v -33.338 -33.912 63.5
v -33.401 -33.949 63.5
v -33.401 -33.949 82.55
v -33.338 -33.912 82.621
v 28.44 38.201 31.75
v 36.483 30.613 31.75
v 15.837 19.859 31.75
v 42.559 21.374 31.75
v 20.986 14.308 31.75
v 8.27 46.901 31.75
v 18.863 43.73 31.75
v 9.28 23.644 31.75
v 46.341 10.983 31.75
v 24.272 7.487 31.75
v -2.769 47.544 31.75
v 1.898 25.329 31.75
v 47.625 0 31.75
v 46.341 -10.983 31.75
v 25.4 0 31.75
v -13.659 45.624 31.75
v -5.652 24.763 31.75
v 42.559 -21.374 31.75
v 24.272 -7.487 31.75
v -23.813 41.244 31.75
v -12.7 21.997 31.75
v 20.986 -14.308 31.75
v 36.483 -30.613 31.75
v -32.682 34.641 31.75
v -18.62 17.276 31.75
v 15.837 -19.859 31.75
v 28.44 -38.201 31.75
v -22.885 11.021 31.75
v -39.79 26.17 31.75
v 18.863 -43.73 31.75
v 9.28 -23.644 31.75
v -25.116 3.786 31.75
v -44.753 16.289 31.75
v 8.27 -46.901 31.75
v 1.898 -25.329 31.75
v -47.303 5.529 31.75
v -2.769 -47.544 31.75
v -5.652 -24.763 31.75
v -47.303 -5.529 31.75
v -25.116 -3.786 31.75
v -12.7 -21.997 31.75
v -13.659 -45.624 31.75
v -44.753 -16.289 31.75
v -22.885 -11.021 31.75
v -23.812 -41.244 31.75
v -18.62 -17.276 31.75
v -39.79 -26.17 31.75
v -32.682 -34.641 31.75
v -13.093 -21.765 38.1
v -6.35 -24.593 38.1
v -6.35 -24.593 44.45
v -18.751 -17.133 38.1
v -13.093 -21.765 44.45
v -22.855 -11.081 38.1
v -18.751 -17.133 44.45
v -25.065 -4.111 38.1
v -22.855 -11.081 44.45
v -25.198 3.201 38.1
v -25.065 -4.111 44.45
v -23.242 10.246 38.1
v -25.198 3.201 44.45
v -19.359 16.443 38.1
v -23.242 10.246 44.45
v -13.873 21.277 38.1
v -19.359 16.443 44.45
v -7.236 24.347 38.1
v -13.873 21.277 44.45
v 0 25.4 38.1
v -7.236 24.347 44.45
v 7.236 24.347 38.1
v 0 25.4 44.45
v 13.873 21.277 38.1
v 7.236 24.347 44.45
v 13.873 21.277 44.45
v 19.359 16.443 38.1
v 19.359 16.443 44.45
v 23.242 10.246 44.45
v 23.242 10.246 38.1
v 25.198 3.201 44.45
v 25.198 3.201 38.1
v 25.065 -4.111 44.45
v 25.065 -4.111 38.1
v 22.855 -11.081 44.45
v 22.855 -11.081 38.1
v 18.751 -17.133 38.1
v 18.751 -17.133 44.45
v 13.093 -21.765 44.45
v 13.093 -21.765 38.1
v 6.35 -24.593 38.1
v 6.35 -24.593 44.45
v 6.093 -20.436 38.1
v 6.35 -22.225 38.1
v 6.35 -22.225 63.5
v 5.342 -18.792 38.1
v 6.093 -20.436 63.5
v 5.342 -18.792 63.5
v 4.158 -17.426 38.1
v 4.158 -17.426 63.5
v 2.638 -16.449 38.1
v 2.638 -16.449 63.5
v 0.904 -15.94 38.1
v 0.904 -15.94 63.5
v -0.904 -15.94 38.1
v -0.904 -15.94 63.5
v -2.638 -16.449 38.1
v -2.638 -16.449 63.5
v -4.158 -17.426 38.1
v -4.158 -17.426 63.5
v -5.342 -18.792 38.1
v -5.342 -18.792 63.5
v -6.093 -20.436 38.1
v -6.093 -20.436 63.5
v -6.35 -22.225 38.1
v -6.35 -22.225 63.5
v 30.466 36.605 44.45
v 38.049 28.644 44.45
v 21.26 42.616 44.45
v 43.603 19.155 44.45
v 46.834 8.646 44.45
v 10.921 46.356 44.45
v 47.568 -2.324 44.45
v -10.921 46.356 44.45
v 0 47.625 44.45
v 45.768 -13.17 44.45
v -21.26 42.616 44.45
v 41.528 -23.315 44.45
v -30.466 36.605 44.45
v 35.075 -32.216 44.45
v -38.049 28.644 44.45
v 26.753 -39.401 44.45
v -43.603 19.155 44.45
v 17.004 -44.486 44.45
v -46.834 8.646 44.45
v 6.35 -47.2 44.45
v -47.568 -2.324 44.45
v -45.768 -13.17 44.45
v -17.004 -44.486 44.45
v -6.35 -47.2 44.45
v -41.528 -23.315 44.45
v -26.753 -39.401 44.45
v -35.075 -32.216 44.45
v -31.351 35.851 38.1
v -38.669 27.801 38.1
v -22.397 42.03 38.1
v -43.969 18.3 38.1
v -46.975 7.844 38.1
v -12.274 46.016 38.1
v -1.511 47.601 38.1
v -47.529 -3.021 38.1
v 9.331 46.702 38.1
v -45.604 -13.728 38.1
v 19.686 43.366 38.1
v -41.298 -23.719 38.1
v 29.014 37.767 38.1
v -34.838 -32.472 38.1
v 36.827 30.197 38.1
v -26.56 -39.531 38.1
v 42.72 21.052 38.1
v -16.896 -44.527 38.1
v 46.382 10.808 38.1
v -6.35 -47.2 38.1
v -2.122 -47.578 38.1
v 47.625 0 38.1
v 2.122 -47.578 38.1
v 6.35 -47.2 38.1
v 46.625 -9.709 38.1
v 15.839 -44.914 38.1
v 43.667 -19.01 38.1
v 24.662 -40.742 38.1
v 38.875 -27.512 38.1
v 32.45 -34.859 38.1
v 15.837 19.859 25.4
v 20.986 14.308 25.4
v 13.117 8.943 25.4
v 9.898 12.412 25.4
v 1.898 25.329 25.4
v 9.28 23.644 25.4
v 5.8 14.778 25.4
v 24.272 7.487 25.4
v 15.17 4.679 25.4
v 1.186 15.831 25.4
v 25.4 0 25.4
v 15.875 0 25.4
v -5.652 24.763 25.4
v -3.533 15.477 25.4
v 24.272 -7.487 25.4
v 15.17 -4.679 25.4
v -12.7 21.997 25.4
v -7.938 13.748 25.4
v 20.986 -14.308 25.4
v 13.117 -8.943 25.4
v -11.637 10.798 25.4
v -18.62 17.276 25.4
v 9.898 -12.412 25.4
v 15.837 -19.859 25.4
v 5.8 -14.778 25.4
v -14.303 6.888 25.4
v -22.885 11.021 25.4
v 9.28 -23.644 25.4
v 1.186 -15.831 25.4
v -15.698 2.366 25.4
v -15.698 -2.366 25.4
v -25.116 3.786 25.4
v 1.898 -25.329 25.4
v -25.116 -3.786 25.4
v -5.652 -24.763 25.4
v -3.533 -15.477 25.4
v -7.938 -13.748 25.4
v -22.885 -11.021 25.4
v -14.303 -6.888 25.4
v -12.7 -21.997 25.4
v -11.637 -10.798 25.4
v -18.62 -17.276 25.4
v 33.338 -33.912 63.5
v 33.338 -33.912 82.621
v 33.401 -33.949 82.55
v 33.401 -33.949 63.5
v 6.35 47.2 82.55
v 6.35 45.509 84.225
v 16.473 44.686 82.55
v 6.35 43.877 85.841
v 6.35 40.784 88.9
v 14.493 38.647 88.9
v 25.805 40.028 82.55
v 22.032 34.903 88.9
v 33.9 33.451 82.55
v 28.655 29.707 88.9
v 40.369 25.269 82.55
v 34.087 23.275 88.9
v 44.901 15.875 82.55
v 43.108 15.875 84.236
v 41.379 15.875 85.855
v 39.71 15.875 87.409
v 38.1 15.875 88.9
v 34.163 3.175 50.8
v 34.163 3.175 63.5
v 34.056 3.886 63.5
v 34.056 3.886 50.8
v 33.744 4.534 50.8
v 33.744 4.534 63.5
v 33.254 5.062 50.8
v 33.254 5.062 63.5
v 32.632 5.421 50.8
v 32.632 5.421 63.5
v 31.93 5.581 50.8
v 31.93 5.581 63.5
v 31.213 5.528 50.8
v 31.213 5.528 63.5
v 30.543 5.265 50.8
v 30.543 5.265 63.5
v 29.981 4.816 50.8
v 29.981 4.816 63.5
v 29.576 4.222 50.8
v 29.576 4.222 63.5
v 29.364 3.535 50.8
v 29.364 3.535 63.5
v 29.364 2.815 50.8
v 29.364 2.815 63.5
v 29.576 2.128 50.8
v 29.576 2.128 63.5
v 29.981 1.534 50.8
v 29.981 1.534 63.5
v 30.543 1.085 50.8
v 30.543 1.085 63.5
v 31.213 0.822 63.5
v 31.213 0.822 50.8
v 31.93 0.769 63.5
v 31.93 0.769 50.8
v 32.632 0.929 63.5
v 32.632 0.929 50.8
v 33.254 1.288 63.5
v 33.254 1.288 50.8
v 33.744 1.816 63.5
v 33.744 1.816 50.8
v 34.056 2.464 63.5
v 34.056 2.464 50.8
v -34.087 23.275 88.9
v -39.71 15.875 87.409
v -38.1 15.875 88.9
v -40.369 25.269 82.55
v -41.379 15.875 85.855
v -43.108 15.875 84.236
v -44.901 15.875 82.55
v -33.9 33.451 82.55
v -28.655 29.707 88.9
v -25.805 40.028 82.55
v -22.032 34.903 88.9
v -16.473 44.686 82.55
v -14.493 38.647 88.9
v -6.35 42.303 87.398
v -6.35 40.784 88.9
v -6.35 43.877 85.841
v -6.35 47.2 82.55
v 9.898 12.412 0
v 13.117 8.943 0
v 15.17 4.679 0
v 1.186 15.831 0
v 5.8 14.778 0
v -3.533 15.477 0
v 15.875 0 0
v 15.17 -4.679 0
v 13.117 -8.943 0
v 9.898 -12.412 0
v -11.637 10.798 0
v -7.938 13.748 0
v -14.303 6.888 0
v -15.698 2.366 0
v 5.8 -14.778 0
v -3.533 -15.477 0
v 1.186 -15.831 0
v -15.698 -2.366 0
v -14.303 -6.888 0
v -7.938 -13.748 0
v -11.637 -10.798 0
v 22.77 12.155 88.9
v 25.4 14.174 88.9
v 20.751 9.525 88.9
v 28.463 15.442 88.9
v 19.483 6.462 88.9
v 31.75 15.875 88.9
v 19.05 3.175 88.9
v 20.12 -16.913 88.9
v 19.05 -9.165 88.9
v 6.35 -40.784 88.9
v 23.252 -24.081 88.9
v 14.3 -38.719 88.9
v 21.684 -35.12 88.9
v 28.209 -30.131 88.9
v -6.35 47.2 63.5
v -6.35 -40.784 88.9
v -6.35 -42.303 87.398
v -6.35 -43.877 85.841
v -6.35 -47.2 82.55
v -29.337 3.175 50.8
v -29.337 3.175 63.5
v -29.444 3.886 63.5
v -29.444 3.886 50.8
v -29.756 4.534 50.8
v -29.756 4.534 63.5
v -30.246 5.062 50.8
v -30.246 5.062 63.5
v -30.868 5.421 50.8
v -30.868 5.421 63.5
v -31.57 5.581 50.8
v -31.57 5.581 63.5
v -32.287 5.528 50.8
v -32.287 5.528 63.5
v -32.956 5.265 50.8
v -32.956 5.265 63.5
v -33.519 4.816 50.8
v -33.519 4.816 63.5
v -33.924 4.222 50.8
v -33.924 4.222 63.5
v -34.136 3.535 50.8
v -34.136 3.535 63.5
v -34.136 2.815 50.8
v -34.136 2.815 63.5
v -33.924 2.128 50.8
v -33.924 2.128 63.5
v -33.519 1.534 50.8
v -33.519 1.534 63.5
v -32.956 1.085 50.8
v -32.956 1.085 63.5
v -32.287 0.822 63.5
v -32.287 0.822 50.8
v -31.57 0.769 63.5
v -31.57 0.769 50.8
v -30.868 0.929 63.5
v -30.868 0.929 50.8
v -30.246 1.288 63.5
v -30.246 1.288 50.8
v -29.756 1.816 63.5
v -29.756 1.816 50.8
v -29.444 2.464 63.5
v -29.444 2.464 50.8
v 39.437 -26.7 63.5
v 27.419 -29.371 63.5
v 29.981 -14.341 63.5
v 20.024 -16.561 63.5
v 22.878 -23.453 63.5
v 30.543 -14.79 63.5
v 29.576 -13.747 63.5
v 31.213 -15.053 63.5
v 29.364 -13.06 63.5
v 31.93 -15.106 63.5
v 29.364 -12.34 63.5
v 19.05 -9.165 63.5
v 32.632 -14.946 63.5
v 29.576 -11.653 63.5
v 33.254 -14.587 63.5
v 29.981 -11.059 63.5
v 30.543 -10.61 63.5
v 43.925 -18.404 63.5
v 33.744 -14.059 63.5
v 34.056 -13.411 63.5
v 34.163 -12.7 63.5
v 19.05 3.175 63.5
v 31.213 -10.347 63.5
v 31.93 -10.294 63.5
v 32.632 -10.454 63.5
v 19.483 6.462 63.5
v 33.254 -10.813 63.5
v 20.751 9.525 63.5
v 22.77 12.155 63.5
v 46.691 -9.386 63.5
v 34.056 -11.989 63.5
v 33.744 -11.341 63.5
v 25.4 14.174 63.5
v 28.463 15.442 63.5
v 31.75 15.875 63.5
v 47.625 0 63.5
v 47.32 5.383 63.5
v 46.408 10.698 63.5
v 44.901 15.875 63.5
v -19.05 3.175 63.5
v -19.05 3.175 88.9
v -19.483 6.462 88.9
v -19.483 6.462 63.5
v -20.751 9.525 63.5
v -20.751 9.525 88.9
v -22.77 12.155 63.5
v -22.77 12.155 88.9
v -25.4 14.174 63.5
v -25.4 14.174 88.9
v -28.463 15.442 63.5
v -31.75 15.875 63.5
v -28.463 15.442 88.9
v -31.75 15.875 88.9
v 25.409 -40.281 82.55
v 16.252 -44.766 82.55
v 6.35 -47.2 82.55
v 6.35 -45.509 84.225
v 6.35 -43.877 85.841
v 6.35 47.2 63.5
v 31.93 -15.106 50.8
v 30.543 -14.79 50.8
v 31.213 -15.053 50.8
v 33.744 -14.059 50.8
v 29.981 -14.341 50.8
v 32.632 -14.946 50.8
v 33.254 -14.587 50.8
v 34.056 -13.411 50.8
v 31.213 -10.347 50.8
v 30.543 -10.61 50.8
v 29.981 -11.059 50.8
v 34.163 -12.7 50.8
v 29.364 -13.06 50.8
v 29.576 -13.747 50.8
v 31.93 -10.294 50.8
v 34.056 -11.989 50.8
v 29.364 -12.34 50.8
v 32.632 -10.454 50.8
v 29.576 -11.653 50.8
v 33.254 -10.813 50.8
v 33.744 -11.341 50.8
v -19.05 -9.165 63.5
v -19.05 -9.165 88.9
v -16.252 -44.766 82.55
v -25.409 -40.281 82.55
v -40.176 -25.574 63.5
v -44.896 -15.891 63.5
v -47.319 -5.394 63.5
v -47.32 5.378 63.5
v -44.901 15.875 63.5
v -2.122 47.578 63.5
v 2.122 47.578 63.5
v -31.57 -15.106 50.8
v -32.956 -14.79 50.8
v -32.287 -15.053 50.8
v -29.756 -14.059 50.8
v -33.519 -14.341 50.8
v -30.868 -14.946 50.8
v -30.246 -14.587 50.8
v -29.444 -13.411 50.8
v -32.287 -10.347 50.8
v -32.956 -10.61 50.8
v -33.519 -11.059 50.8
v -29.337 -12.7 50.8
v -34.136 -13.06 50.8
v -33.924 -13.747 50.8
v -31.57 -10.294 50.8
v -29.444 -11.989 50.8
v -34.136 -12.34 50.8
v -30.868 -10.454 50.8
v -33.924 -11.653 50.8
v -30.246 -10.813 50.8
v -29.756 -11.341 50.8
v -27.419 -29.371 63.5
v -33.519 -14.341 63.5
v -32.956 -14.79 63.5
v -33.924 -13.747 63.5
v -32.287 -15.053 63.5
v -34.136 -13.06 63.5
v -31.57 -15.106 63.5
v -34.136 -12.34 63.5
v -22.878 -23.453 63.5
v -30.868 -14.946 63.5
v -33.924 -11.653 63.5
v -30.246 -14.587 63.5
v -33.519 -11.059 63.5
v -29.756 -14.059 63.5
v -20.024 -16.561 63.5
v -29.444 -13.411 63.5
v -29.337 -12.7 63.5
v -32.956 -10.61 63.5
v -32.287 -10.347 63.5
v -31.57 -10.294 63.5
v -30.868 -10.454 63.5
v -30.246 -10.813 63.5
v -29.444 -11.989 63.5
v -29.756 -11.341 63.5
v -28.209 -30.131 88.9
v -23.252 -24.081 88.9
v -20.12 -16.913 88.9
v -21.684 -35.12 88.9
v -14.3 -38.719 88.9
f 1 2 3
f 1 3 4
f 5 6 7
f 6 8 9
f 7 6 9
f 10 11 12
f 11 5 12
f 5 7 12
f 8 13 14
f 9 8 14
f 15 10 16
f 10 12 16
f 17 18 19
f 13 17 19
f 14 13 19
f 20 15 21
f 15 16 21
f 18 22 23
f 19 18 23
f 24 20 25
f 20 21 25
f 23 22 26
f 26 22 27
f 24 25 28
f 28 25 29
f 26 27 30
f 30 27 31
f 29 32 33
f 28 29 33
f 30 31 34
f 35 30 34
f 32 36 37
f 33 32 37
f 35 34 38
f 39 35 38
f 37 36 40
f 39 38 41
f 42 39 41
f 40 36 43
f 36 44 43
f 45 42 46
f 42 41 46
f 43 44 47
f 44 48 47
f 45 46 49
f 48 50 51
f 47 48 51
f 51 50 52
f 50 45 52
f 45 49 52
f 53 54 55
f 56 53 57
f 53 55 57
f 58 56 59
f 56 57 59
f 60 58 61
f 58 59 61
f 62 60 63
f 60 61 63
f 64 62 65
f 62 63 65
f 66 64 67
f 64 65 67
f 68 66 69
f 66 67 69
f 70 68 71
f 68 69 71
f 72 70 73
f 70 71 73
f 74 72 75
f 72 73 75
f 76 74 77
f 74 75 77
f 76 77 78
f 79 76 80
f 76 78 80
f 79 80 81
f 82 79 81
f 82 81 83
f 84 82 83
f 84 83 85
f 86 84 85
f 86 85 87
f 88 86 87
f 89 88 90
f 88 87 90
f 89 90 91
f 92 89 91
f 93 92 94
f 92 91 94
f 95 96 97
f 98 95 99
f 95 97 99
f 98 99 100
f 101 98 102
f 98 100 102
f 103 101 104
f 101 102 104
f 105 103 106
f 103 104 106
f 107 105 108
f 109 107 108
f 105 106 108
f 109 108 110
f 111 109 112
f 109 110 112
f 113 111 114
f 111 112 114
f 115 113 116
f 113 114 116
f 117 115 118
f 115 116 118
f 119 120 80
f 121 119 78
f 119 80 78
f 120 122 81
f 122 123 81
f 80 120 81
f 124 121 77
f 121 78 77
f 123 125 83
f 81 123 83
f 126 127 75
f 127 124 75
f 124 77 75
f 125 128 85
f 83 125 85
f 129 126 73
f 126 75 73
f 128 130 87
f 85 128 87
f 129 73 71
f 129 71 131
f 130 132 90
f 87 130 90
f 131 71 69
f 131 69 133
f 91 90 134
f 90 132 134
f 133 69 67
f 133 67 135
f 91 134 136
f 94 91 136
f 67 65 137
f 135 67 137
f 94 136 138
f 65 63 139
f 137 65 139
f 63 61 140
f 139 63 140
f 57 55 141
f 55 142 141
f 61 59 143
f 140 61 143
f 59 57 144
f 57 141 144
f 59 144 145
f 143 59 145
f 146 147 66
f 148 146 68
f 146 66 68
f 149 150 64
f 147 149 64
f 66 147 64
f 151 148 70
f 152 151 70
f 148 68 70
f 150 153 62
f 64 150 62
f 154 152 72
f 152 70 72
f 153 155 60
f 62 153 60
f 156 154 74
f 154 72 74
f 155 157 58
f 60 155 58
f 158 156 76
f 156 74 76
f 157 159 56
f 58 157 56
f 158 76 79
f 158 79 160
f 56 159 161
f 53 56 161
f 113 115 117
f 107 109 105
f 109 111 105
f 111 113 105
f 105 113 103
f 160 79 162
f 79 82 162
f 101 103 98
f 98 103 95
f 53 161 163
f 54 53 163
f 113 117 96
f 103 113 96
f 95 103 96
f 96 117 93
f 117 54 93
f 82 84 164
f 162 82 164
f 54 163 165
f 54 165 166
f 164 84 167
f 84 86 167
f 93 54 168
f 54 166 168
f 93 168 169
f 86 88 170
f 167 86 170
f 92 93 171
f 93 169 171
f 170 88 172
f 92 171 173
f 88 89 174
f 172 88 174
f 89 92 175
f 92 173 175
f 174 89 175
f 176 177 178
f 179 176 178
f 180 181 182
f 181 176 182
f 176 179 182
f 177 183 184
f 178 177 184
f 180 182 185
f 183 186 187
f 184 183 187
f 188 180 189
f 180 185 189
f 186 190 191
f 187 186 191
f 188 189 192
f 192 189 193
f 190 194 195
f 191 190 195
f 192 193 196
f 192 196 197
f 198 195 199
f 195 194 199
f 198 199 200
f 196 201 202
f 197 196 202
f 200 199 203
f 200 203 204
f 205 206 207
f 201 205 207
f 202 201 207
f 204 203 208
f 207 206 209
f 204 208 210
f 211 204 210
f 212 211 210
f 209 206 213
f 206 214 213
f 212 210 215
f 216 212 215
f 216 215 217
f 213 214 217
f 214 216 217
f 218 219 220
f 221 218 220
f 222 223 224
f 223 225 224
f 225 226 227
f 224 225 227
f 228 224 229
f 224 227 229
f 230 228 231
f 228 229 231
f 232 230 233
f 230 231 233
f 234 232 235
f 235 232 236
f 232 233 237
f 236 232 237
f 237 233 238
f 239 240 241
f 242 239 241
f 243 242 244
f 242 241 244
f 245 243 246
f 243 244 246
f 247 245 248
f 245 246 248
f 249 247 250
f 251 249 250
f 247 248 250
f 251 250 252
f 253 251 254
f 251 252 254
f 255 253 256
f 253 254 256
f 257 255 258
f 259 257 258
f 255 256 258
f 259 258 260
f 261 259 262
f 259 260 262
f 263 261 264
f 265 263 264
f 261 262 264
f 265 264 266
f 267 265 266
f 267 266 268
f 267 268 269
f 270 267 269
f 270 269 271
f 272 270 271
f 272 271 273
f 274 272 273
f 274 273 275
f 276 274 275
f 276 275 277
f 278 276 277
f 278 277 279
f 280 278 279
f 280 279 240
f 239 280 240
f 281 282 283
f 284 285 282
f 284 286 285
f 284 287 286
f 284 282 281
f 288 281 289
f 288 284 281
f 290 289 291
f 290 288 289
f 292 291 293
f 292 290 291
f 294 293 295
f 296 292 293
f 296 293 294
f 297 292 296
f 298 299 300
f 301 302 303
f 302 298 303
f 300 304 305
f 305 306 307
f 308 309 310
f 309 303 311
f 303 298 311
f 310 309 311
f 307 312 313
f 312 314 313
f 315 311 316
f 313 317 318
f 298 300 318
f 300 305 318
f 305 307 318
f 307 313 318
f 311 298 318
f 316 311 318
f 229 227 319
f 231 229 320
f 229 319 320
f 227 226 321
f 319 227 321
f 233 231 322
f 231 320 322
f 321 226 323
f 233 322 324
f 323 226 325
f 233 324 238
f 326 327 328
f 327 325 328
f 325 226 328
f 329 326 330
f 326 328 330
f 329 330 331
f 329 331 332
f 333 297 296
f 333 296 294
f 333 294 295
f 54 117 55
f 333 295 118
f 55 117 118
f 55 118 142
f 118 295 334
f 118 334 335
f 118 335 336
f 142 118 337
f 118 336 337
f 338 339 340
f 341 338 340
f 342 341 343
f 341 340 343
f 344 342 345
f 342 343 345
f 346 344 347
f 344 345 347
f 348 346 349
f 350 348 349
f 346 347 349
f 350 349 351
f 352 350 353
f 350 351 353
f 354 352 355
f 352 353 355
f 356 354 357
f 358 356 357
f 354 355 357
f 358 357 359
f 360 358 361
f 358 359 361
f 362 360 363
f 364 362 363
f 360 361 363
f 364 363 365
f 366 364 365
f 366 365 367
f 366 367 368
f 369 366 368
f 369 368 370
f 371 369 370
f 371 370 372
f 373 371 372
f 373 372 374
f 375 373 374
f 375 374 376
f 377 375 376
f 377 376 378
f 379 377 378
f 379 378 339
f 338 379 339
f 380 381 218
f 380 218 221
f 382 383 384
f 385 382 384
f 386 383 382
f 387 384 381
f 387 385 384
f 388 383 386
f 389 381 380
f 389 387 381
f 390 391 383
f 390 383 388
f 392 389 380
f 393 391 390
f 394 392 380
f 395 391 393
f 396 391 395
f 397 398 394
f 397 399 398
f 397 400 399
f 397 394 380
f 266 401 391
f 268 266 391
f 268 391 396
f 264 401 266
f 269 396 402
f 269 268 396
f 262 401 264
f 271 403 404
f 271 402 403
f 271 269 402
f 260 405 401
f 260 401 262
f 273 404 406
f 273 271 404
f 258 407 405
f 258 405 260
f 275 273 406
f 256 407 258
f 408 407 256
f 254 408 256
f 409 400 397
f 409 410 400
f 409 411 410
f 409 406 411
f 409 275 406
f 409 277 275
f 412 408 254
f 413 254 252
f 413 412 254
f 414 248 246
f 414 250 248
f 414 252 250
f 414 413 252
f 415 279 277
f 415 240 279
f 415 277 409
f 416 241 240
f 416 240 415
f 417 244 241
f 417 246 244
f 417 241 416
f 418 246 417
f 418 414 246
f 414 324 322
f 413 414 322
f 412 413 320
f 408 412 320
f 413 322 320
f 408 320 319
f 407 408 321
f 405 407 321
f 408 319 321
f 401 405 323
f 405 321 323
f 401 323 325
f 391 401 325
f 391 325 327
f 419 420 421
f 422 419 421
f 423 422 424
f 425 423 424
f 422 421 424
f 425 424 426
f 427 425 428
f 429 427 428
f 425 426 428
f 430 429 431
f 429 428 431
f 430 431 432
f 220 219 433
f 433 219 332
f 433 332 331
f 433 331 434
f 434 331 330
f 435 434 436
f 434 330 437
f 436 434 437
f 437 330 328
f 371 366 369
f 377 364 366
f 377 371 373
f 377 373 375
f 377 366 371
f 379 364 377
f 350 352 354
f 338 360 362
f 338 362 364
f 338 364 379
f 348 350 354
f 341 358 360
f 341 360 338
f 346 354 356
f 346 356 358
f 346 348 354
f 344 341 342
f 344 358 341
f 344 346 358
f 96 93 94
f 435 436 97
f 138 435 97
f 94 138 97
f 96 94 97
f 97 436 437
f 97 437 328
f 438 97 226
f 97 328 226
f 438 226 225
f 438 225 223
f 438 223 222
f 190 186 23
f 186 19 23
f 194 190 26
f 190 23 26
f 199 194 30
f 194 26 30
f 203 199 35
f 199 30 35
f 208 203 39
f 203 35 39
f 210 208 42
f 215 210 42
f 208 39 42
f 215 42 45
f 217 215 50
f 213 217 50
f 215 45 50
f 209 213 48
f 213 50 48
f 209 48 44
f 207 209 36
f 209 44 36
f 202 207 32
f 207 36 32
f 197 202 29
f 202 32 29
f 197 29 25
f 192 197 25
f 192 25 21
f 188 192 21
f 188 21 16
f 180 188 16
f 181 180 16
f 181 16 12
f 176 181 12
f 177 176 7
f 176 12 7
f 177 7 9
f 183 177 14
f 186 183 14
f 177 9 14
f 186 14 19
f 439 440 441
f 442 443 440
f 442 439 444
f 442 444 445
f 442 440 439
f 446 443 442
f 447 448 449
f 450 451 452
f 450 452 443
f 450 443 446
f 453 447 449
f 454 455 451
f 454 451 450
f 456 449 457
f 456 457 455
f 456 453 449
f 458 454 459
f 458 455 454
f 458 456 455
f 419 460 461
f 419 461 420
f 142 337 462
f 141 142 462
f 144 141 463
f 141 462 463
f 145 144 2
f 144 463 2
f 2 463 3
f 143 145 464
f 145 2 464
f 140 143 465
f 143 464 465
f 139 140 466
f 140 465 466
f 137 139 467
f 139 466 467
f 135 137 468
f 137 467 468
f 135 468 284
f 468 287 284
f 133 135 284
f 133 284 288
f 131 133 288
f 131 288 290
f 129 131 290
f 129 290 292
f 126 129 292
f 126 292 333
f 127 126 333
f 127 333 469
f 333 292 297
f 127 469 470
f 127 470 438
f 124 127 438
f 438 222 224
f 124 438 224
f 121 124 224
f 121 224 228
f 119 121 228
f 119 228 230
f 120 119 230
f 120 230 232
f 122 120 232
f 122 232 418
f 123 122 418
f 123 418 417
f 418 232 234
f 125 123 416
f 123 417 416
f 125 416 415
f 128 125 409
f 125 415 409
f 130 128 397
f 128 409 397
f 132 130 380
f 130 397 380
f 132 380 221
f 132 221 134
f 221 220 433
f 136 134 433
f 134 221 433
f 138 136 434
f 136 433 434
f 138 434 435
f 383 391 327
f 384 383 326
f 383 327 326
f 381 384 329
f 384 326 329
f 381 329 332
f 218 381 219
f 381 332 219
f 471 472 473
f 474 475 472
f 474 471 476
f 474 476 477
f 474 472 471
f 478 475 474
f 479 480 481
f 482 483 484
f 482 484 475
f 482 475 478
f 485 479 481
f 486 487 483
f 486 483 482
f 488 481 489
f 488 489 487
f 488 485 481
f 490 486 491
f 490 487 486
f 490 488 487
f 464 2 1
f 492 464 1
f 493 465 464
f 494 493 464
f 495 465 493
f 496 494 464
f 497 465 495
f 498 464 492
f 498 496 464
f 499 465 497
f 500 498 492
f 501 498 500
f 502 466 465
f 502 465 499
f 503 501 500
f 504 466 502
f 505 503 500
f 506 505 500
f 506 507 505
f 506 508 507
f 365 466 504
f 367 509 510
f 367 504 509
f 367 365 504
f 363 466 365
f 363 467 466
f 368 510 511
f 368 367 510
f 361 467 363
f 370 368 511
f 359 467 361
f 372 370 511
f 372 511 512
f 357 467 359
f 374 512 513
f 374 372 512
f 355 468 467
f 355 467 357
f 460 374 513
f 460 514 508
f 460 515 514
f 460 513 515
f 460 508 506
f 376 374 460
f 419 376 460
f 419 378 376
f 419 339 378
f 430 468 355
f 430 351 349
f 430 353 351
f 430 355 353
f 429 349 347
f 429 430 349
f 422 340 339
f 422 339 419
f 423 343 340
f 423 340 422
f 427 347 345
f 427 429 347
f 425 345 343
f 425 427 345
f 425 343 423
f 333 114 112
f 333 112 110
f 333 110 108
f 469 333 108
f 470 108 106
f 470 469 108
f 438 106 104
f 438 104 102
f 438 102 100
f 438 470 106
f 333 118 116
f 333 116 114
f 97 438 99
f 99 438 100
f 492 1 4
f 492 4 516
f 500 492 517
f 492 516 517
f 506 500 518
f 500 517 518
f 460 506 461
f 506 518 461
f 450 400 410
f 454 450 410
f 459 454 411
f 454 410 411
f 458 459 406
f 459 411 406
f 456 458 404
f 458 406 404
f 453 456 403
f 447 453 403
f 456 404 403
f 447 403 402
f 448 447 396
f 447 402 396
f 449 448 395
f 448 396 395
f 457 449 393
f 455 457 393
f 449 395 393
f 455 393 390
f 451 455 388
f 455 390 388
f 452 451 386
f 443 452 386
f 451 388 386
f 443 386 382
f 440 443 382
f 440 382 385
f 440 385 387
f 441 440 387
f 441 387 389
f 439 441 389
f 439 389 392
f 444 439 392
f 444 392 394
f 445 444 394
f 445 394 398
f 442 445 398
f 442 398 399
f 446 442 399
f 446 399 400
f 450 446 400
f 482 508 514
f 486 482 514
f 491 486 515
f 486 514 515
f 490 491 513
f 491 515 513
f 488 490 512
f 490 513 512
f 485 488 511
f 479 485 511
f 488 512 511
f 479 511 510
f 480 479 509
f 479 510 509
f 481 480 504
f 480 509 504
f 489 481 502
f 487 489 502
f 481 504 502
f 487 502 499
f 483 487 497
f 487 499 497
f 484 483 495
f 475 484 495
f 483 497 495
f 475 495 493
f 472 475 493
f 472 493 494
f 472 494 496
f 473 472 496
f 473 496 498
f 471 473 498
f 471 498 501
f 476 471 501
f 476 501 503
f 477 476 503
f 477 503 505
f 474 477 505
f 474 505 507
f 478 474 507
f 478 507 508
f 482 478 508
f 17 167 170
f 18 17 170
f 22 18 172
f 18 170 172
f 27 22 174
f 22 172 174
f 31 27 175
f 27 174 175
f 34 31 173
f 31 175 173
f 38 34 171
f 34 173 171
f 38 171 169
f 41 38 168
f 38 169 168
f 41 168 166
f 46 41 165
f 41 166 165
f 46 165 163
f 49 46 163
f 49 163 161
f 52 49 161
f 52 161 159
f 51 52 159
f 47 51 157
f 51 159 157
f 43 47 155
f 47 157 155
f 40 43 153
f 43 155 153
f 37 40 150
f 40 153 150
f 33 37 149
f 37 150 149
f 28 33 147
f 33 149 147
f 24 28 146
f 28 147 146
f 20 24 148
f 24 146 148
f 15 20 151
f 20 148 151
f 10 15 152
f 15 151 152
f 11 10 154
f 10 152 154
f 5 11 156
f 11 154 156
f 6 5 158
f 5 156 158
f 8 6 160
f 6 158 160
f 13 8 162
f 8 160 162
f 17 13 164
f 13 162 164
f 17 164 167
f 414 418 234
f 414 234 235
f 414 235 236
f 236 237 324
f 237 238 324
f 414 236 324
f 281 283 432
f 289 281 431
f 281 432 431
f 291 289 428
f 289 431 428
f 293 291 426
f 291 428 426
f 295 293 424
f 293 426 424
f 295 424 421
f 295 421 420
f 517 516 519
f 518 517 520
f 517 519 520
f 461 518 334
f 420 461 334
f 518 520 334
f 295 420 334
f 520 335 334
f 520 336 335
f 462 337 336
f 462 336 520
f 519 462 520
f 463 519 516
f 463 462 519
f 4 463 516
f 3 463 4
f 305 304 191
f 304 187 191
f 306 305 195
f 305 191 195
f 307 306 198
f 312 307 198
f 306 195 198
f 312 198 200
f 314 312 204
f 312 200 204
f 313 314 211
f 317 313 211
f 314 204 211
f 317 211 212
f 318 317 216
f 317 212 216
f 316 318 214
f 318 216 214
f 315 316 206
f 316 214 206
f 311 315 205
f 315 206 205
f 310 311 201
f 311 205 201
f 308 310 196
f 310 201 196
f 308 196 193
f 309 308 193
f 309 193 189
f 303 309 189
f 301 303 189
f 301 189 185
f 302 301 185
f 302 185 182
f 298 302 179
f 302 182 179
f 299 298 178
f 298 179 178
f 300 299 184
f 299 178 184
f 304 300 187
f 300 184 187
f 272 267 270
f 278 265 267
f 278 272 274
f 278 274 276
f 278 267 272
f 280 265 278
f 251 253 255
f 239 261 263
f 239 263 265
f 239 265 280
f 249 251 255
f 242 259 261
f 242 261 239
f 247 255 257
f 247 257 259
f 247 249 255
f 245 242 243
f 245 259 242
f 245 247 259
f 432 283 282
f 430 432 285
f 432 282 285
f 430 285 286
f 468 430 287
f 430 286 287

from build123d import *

# Parameters (mm, degrees)
F2_R     = 2.413
F3_DEPTH = 25.4
F4_DEPTH = 50.8
F5_DEPTH = 38.1
F8_SIZE  = 6.35


with BuildPart() as f1:
    # F0 (on Front) → F1 (revolve)
    with BuildSketch(Plane.XZ):
        Polygon((0, 0), (15.875, 0), (15.875, 25.4), (25.4, 25.4), (25.4, 31.75), (47.625, 31.75), (47.625, 38.1), (25.4, 38.1), (25.4, 44.45), (28.9087127894, 44.45), (47.625, 44.45), (47.625, 88.9), (0, 88.9), align=None)
    revolve(axis=Axis((0, 0, 44.45), (0, 0, -1)))

    # F2 (on face) → F3 (cut)
    with BuildSketch(Plane.XY.offset(88.9)):
        with BuildLine():
            ThreePointArc((47.625, 0), (46.9391314035, 8.0534817368), (44.9012806053, 15.875))
            Line((44.9012806053, 15.875), (31.75, 15.875))
            ThreePointArc((31.75, 15.875), (22.7697438789, 12.1552561211), (19.05, 3.175))
            Line((19.05, 3.175), (19.05, -9.1654355234))
            ThreePointArc((19.05, -9.1654355234), (22.8783240869, -23.4529355234), (33.3375, -33.9121114365))
            Line((33.3375, -33.9121114365), (33.4009492811, -33.9487438961))
            ThreePointArc((33.4009492811, -33.9487438961), (43.9252822103, -18.4040812795), (47.625, 0))
        make_face()
        with Locations((31.75, -12.7)):
            Circle(F2_R, mode=Mode.SUBTRACT)
        with Locations((31.75, 3.175)):
            Circle(F2_R, mode=Mode.SUBTRACT)
        with BuildLine():
            Line((-6.35, 47.1997682727), (-6.35, -10.9985226281))
            Line((-6.35, -10.9985226281), (0, -14.6646968374))
            Line((0, -14.6646968374), (6.35, -10.9985226281))
            Line((6.35, -10.9985226281), (6.35, 47.1997682727))
            ThreePointArc((6.35, 47.1997682727), (0, 47.625), (-6.35, 47.1997682727))
        make_face()
        with BuildLine():
            ThreePointArc((-33.3375, -33.9121114365), (-22.8783240869, -23.4529355234), (-19.05, -9.1654355234))
            Line((-19.05, -9.1654355234), (-19.05, 3.175))
            ThreePointArc((-19.05, 3.175), (-22.7697438789, 12.1552561211), (-31.75, 15.875))
            Line((-31.75, 15.875), (-44.9012806053, 15.875))
            ThreePointArc((-44.9012806053, 15.875), (-46.4048614399, -10.711183863), (-33.4009492811, -33.9487438961))
            Line((-33.4009492811, -33.9487438961), (-33.3375, -33.9121114365))
        make_face()
        with Locations((-31.75, -12.7)):
            Circle(F2_R, mode=Mode.SUBTRACT)
        with Locations((-31.75, 3.175)):
            Circle(F2_R, mode=Mode.SUBTRACT)
        with BuildLine():
            Line((0, -14.6646968374), (-6.35, -18.3308710468))
            Line((-6.35, -18.3308710468), (-6.35, -22.225))
            ThreePointArc((-6.35, -22.225), (0, -15.875), (6.35, -22.225))
            Line((6.35, -22.225), (6.35, -18.3308710468))
            Line((6.35, -18.3308710468), (0, -14.6646968374))
        make_face()
        Polygon((6.35, -10.9985226281), (0, -14.6646968374), (6.35, -18.3308710468), align=None)
        Polygon((-6.35, -10.9985226281), (-6.35, -18.3308710468), (0, -14.6646968374), align=None)
        with Locations((-31.75, 3.175)):
            Circle(F2_R)
        with Locations((-31.75, -12.7)):
            Circle(F2_R)
        with Locations((31.75, -12.7)):
            Circle(F2_R)
        with Locations((31.75, 3.175)):
            Circle(F2_R)
    extrude(amount=-F3_DEPTH, mode=Mode.SUBTRACT)

    # F2 (on face) → F4 (cut)
    with BuildSketch(Plane.XY.offset(88.9)):
        with BuildLine():
            ThreePointArc((6.35, -22.225), (0, -15.875), (-6.35, -22.225))
            Line((-6.35, -22.225), (6.35, -22.225))
        make_face()
        with BuildLine():
            Line((-6.35, -22.225), (-6.35, -47.1997682727))
            ThreePointArc((-6.35, -47.1997682727), (0, -47.625), (6.35, -47.1997682727))
            Line((6.35, -47.1997682727), (6.35, -22.225))
            Line((6.35, -22.225), (-6.35, -22.225))
        make_face()
    extrude(amount=-F4_DEPTH, mode=Mode.SUBTRACT)

    # F2 (on face) → F5 (cut)
    with BuildSketch(Plane.XY.offset(88.9)):
        with Locations((-31.75, 3.175)):
            Circle(F2_R)
        with Locations((-31.75, -12.7)):
            Circle(F2_R)
        with Locations((31.75, 3.175)):
            Circle(F2_R)
        with Locations((31.75, -12.7)):
            Circle(F2_R)
    extrude(amount=-F5_DEPTH, mode=Mode.SUBTRACT)

    # F8
    f8_edges = [f1.edges().sort_by_distance(p)[0] for p in [
        (20.950702, -42.76925, 88.9),
        (-20.950702, -42.76925, 88.9),
        (-30.033044, 36.96156, 88.9),
        (30.033044, 36.96156, 88.9),
    ]]
    chamfer(f8_edges, length=F8_SIZE)


solid = f1.part
